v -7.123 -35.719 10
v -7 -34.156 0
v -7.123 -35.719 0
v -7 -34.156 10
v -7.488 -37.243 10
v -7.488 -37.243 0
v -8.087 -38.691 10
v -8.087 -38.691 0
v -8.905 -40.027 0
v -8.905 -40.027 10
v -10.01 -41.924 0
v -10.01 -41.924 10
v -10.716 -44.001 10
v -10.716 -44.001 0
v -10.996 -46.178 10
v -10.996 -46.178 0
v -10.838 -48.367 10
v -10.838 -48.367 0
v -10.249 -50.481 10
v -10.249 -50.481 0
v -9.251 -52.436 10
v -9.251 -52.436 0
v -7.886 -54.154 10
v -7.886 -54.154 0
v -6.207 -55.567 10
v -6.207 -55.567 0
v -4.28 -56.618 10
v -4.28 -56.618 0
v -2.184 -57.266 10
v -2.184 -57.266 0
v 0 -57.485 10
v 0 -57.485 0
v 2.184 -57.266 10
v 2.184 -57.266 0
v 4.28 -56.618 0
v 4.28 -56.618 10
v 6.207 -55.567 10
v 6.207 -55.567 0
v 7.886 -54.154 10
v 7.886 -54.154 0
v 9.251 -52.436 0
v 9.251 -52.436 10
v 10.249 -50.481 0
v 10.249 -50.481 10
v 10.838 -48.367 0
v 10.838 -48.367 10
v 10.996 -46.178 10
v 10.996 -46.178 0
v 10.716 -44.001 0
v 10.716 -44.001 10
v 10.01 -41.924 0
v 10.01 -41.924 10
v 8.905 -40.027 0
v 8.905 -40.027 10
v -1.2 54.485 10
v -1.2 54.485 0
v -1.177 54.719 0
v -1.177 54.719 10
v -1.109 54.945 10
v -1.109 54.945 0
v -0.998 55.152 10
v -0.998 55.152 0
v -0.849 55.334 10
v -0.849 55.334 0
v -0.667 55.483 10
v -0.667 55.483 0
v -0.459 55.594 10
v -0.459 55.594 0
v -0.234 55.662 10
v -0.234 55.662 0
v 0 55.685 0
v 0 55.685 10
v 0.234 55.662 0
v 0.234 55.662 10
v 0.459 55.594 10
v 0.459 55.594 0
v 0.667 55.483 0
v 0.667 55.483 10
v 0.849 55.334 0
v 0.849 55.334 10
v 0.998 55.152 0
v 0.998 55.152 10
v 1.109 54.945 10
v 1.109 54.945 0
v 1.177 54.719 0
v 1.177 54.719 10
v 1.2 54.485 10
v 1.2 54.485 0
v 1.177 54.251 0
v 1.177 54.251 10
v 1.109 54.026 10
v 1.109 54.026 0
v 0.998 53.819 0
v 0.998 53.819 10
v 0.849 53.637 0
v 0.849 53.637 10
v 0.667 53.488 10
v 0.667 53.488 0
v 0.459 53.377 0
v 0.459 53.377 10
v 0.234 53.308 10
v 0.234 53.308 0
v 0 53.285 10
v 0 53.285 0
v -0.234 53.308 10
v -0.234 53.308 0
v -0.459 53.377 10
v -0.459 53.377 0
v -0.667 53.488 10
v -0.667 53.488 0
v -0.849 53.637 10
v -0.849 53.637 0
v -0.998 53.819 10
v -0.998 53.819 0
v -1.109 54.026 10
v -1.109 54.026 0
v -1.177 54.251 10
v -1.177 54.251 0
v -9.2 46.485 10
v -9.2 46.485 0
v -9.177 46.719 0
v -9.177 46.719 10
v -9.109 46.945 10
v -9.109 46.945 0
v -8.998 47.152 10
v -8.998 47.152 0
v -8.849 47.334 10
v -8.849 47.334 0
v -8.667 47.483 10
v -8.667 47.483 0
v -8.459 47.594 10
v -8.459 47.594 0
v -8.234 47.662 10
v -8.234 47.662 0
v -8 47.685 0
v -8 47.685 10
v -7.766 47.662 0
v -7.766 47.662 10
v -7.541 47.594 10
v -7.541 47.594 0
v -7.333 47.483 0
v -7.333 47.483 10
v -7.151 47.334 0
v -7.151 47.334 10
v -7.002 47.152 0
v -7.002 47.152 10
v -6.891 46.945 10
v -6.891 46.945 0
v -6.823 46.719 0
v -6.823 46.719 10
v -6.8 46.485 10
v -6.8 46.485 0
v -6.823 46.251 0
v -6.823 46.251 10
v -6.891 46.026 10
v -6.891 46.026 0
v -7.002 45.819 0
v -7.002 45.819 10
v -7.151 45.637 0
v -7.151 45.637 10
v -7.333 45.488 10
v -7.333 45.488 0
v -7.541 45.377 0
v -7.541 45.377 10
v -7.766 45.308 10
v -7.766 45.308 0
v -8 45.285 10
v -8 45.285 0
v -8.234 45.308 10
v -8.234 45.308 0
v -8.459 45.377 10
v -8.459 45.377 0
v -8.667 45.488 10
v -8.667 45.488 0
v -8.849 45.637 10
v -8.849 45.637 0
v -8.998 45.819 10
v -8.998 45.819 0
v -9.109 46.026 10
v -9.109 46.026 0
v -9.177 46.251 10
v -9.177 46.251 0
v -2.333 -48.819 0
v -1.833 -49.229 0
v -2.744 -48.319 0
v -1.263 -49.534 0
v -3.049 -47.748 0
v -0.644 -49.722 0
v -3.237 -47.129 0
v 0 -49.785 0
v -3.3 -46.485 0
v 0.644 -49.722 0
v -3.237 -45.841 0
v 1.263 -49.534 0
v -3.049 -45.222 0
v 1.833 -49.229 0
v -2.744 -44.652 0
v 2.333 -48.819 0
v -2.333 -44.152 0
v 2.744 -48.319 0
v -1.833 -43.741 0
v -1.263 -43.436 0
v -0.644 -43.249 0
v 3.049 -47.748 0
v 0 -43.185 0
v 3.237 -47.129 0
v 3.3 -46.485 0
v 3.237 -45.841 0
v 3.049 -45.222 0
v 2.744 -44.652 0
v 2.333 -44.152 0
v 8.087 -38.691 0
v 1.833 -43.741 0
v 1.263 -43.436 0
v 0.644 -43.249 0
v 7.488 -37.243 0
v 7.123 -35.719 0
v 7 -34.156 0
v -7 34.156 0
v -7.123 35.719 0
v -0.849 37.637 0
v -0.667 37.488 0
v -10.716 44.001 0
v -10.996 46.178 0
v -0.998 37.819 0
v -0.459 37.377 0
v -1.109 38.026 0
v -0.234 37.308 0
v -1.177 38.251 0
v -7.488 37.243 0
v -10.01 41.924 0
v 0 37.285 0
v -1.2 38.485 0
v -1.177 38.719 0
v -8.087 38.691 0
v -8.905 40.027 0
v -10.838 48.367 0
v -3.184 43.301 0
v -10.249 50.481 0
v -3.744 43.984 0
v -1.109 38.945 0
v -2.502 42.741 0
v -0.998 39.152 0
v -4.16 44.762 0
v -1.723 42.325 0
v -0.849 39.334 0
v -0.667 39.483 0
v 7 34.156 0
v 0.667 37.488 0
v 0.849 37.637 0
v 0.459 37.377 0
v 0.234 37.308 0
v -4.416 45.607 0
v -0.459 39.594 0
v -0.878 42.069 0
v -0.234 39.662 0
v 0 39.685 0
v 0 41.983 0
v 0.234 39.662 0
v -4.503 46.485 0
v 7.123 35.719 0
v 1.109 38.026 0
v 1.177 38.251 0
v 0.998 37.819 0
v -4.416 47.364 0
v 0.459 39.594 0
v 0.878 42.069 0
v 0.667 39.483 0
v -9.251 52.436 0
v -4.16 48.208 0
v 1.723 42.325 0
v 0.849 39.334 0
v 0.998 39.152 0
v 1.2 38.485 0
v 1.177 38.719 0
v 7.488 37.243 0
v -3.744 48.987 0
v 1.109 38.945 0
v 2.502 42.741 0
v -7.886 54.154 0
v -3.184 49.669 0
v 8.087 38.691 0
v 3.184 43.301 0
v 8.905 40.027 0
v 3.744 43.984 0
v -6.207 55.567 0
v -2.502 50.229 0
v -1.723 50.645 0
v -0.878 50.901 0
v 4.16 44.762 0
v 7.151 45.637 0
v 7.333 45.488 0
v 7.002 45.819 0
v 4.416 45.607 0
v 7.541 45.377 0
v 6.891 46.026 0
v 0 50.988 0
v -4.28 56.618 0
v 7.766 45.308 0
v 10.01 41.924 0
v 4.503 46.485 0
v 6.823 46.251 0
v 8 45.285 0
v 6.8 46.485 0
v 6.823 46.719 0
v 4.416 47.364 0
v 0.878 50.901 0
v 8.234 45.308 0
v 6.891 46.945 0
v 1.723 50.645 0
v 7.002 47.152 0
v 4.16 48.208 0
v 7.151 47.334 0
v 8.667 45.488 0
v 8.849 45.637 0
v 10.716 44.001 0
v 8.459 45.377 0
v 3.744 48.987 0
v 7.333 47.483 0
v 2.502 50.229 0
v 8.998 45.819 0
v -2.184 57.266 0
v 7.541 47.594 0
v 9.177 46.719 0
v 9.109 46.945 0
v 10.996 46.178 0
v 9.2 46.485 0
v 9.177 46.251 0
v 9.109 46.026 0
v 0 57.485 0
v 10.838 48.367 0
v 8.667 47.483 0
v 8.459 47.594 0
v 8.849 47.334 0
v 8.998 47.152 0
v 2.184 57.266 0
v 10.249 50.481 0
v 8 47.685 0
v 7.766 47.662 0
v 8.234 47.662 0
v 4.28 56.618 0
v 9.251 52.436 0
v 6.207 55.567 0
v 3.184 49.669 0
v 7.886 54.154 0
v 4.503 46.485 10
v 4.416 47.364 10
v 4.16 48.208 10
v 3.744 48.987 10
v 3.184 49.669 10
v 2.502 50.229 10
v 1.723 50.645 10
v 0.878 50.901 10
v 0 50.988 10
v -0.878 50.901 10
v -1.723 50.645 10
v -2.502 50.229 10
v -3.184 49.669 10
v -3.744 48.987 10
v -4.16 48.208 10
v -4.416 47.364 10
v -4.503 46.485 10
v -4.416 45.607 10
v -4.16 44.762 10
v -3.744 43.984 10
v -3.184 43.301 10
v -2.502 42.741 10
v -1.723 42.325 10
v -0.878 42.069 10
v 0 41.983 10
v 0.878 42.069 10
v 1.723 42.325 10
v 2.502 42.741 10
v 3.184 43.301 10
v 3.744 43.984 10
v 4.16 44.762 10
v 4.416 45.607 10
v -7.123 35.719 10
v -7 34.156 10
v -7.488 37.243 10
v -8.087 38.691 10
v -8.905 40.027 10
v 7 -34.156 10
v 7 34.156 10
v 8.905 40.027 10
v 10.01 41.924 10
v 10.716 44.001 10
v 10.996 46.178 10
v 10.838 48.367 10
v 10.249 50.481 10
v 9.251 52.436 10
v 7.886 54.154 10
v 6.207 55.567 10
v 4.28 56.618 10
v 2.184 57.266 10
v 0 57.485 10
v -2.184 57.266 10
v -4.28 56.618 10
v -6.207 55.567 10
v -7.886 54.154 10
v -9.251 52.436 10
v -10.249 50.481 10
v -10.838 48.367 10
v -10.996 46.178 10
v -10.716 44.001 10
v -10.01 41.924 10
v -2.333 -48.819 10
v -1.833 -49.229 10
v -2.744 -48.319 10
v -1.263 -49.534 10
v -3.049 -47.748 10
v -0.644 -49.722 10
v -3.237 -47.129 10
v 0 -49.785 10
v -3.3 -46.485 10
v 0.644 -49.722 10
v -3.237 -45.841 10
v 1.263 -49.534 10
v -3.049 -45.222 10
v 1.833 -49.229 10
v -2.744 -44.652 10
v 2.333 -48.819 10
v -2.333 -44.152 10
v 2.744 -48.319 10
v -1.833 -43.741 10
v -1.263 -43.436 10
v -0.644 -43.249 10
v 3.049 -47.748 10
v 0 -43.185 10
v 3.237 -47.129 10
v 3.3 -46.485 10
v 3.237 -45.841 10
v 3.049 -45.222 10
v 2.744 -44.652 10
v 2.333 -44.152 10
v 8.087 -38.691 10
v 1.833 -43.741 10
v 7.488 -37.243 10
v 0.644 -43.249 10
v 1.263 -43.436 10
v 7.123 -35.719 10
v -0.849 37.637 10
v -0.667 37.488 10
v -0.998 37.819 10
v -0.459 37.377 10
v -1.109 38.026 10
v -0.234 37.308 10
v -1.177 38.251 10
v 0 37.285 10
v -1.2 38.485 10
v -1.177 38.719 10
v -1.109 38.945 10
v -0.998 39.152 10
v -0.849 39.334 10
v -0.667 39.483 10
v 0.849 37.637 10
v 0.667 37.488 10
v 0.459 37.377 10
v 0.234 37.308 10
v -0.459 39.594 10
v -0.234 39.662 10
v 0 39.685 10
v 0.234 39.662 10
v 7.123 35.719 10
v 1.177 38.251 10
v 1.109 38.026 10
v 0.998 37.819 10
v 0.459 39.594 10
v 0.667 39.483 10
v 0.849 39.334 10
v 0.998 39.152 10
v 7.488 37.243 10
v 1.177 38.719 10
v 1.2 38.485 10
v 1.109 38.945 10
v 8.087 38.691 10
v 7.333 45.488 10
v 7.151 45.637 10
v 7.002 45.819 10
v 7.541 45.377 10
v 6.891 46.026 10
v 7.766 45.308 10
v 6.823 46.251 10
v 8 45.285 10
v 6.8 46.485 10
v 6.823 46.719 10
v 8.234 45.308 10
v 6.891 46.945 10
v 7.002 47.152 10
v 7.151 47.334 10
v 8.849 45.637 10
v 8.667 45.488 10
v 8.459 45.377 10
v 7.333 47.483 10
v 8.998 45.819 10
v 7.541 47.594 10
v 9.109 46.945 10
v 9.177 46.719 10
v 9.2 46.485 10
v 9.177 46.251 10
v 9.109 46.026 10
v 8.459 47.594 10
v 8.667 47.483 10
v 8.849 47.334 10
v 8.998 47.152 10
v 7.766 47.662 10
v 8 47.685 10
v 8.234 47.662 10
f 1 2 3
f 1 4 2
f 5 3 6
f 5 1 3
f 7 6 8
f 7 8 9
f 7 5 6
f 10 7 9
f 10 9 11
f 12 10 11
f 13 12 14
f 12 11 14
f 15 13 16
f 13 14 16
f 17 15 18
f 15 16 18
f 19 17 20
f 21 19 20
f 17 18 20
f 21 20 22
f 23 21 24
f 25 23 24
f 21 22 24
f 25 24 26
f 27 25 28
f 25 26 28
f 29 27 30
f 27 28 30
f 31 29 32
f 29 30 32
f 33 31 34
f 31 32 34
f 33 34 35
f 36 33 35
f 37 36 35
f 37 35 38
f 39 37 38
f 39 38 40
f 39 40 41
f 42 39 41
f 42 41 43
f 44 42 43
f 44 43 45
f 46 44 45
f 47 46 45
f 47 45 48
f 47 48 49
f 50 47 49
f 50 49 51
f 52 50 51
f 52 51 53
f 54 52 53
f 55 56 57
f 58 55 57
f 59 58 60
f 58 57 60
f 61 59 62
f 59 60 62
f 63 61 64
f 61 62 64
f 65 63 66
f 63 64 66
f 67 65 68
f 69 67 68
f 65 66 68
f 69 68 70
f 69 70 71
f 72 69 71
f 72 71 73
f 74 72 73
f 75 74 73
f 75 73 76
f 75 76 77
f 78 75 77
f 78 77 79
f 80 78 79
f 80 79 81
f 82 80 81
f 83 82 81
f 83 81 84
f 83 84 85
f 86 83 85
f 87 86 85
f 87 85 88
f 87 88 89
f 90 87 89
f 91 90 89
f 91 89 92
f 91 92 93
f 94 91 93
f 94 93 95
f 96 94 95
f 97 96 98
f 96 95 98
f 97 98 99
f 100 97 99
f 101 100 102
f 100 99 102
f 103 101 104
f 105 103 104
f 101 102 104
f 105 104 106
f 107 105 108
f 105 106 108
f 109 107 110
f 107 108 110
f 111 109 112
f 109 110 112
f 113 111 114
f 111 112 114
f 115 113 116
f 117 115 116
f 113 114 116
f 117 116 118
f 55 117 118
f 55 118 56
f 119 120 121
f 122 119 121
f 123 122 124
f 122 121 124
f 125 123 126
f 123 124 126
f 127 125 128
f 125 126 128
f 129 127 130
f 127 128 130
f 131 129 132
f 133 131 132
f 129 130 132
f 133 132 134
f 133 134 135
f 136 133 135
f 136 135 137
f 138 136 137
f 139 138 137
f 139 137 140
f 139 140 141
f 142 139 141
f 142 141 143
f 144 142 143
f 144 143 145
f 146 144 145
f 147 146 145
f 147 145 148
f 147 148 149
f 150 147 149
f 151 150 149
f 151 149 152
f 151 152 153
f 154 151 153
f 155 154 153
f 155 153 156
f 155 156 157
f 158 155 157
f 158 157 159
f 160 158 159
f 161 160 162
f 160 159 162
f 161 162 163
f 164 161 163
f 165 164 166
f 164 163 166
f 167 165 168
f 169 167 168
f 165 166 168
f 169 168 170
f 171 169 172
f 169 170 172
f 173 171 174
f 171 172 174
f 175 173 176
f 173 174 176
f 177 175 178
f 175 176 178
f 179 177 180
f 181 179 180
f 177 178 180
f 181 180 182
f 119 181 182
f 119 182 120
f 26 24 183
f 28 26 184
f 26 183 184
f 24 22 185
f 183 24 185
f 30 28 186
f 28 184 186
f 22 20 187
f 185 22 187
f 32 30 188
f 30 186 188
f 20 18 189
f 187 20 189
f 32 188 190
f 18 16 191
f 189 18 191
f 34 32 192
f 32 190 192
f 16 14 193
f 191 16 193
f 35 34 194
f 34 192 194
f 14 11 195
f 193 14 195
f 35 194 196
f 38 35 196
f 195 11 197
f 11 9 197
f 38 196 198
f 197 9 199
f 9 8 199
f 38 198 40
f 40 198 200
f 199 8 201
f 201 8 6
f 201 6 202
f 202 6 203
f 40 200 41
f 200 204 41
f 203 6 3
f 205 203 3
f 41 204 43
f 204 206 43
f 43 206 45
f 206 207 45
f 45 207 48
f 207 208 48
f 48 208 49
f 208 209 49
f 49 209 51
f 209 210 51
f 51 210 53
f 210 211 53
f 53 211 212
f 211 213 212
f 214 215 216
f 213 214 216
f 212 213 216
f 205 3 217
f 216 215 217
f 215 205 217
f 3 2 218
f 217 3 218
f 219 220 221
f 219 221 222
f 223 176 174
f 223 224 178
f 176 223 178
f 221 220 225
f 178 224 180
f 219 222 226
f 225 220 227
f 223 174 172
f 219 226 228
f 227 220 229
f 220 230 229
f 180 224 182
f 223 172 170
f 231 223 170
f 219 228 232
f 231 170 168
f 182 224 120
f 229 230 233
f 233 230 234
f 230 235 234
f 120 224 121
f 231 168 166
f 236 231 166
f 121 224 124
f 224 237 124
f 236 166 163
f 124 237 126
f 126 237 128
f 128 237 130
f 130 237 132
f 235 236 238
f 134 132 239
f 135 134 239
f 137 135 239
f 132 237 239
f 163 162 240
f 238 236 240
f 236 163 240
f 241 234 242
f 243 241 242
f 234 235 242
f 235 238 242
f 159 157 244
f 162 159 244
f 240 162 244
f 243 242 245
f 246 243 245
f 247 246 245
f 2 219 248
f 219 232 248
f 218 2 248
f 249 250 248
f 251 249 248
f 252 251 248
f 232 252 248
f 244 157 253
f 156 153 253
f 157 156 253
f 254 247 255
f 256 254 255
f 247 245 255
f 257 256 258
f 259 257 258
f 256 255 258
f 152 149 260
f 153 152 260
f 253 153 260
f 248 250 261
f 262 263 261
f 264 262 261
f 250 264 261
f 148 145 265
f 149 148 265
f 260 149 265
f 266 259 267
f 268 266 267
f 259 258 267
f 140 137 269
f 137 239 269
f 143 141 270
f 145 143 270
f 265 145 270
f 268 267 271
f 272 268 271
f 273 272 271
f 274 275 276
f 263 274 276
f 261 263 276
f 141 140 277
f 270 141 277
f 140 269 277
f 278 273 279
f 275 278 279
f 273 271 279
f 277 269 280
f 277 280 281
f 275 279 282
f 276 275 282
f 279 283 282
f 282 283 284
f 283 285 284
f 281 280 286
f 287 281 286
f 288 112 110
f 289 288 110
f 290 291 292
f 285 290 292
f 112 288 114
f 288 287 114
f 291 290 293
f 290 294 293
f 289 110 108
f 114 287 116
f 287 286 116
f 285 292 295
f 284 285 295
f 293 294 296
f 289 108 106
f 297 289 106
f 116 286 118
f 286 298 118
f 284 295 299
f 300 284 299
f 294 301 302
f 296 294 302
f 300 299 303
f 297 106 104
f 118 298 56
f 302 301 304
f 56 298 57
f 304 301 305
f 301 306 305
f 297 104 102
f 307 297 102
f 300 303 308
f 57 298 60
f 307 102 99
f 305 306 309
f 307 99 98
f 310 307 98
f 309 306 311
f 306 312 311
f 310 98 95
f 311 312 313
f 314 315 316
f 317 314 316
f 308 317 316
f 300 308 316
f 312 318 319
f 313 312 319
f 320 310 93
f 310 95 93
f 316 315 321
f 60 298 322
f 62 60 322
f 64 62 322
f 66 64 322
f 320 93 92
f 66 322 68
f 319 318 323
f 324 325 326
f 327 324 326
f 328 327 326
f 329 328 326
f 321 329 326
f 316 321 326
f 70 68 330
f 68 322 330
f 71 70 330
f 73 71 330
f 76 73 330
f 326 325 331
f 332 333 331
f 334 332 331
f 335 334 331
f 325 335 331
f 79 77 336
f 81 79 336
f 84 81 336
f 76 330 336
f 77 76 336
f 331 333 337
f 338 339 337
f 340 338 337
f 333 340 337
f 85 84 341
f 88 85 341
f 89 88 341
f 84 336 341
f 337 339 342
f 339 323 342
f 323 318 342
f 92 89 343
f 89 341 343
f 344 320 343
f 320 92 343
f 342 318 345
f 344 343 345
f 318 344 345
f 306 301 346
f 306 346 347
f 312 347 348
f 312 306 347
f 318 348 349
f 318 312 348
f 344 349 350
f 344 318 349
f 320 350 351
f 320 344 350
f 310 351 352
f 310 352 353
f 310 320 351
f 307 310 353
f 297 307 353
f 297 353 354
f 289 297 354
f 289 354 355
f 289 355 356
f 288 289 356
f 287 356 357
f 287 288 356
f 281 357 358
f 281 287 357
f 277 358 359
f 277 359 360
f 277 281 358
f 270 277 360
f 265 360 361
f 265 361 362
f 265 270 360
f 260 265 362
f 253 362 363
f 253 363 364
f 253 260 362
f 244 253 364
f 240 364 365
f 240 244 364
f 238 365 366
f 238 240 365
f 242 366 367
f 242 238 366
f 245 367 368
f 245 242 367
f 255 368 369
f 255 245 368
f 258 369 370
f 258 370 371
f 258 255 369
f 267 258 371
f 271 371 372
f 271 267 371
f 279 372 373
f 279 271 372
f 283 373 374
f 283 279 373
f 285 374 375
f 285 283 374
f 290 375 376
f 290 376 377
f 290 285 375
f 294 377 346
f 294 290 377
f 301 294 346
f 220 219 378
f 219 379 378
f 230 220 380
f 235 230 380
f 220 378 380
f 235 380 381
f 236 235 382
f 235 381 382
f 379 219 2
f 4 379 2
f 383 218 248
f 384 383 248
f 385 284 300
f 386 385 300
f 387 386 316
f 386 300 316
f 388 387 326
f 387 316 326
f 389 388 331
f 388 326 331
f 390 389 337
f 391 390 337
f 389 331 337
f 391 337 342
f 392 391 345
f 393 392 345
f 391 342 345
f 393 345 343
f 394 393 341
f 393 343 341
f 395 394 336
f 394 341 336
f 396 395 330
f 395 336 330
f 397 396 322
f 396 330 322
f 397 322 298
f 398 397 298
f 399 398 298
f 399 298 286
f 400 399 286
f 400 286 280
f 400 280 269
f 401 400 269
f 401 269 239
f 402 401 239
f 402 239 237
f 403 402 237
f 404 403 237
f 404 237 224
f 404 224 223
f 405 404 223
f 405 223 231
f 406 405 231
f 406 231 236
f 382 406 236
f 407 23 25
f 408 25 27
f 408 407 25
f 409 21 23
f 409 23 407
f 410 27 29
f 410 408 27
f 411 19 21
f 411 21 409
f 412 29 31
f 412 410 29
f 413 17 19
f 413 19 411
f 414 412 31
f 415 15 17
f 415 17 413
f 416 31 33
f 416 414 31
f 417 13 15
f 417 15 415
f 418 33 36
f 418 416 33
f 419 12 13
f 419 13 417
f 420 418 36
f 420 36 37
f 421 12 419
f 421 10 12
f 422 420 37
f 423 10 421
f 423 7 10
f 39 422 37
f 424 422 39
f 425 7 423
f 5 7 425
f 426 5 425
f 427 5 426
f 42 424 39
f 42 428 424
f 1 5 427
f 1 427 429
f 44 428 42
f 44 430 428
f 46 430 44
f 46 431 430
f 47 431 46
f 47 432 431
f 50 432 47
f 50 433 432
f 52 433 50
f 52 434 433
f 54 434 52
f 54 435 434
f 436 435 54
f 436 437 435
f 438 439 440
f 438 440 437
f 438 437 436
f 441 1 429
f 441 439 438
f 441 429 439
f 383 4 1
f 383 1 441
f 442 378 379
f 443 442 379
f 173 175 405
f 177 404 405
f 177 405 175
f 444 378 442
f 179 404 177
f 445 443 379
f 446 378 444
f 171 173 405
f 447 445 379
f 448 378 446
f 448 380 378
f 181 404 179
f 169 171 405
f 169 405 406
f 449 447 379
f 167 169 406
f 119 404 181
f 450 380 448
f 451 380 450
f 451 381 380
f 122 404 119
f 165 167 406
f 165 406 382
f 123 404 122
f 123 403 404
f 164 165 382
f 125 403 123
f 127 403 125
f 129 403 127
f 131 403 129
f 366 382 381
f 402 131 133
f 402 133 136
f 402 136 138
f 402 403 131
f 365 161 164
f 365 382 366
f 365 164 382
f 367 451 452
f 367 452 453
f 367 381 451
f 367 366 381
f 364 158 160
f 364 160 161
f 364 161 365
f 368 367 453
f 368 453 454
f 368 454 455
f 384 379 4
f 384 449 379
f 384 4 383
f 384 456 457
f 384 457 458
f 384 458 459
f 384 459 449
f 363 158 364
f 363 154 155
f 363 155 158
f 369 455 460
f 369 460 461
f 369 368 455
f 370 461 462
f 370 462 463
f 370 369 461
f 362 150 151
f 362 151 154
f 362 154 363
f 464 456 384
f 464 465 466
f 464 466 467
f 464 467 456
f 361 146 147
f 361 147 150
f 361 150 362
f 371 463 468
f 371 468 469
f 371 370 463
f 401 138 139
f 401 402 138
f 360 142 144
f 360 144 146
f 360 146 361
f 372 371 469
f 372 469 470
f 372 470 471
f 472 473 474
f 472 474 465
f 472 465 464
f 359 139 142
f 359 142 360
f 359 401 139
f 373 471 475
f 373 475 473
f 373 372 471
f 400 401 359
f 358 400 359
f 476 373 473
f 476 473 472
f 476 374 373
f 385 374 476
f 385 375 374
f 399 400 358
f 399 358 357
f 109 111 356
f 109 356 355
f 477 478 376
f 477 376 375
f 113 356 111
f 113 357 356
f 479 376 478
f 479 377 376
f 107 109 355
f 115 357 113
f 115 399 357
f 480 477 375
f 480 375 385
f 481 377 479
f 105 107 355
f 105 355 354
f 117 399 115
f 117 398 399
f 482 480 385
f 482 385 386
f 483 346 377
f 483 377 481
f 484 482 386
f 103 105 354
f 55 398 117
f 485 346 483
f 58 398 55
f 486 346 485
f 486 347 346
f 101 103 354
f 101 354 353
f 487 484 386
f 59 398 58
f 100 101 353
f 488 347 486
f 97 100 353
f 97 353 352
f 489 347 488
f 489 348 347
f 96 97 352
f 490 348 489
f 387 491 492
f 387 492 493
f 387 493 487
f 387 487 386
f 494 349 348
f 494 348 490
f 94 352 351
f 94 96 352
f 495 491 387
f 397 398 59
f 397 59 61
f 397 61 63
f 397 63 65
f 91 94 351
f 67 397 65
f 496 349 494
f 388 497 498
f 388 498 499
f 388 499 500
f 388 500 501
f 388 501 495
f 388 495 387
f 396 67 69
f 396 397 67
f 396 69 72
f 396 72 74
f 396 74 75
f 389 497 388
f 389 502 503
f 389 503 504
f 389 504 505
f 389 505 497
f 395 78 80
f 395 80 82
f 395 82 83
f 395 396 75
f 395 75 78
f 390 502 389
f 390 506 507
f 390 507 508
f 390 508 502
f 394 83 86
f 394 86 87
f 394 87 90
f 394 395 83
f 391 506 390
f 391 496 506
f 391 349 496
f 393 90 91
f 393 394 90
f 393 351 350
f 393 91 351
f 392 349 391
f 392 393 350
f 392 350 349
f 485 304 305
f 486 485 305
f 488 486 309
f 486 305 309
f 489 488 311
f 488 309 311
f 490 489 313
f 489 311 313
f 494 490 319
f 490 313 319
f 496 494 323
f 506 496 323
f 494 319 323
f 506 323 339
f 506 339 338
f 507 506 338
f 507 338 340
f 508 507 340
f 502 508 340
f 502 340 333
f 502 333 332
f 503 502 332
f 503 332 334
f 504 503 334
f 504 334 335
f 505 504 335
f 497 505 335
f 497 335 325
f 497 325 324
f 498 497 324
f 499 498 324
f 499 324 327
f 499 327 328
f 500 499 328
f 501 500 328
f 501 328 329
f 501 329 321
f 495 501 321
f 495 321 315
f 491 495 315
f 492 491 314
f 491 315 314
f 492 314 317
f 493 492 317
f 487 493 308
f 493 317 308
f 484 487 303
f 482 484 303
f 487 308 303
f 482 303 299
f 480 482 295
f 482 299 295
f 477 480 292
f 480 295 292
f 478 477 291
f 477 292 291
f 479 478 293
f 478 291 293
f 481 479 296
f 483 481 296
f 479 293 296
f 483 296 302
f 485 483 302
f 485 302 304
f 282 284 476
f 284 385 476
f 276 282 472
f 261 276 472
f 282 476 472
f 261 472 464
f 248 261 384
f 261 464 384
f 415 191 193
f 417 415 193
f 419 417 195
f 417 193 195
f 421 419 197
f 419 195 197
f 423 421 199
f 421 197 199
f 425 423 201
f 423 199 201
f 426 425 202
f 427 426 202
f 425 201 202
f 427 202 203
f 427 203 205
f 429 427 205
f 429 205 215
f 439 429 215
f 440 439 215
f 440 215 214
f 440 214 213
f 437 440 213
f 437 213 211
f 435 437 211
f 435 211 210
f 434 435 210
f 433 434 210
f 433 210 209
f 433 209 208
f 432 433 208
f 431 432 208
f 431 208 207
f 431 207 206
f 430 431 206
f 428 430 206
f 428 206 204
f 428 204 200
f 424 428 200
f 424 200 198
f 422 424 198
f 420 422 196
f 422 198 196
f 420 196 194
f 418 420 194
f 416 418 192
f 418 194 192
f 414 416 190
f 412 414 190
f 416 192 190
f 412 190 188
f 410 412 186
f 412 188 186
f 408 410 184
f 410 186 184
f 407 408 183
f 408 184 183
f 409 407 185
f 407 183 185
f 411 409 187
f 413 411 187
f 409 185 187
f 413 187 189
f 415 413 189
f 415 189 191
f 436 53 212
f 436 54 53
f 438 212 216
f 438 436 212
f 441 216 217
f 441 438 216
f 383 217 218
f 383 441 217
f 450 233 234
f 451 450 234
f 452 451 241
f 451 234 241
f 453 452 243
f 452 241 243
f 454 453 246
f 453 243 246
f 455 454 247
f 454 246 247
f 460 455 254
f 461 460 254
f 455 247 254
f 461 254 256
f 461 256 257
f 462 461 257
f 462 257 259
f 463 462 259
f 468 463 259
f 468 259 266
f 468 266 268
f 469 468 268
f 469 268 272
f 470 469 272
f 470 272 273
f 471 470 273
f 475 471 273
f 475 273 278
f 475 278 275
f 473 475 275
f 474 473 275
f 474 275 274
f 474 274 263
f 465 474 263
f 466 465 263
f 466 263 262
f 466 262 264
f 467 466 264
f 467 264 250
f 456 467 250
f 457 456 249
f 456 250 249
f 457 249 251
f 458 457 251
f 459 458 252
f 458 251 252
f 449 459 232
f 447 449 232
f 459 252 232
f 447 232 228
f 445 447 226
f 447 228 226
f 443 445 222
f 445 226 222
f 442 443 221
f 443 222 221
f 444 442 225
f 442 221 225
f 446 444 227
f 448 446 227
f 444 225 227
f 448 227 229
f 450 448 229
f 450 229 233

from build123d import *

# Parameters (mm, degrees)
ESQUISSE1_R        = 4.502635458
BOSS_EXTRU_1_DEPTH = 10
D_GAGEMENT_M21_D   = 2.4
CONG_1_R           = 10
D_GAGEMENT_M61_D   = 6.6


with BuildPart() as part:
    # Esquisse1 → Boss.-Extru.1 (new body)
    with BuildSketch(Plane.XY):
        with BuildLine():
            Line((-7, 38), (-7, -38))
            ThreePointArc((-7, -38), (0, -57.485281374), (7, -38))
            Line((7, -38), (7, 38))
            ThreePointArc((7, 38), (0, 57.485281374), (-7, 38))
        make_face()
        with Locations((0, 46.485281374)):
            Circle(ESQUISSE1_R, mode=Mode.SUBTRACT)
    extrude(amount=BOSS_EXTRU_1_DEPTH)

    # Dégagement M21 (through all)
    with Locations(Plane.XY.offset(10)):
        with Locations((-8, 46.485281374), (0, 54.485281374), (8, 46.485281374), (0, 38.485281374)):
            Hole(D_GAGEMENT_M21_D / 2)

    # Congé1
    cong_1_edges = [part.edges().sort_by_distance(p)[0] for p in [
        (7, 38, 5),
        (7, -38, 5),
        (-7, -38, 5),
        (-7, 38, 5),
    ]]
    fillet(cong_1_edges, radius=CONG_1_R)

    # Dégagement M61 (through all)
    with Locations(Plane.XY.offset(10)):
        with Locations((0, -46.485281374)):
            Hole(D_GAGEMENT_M61_D / 2)


solid = part.part
